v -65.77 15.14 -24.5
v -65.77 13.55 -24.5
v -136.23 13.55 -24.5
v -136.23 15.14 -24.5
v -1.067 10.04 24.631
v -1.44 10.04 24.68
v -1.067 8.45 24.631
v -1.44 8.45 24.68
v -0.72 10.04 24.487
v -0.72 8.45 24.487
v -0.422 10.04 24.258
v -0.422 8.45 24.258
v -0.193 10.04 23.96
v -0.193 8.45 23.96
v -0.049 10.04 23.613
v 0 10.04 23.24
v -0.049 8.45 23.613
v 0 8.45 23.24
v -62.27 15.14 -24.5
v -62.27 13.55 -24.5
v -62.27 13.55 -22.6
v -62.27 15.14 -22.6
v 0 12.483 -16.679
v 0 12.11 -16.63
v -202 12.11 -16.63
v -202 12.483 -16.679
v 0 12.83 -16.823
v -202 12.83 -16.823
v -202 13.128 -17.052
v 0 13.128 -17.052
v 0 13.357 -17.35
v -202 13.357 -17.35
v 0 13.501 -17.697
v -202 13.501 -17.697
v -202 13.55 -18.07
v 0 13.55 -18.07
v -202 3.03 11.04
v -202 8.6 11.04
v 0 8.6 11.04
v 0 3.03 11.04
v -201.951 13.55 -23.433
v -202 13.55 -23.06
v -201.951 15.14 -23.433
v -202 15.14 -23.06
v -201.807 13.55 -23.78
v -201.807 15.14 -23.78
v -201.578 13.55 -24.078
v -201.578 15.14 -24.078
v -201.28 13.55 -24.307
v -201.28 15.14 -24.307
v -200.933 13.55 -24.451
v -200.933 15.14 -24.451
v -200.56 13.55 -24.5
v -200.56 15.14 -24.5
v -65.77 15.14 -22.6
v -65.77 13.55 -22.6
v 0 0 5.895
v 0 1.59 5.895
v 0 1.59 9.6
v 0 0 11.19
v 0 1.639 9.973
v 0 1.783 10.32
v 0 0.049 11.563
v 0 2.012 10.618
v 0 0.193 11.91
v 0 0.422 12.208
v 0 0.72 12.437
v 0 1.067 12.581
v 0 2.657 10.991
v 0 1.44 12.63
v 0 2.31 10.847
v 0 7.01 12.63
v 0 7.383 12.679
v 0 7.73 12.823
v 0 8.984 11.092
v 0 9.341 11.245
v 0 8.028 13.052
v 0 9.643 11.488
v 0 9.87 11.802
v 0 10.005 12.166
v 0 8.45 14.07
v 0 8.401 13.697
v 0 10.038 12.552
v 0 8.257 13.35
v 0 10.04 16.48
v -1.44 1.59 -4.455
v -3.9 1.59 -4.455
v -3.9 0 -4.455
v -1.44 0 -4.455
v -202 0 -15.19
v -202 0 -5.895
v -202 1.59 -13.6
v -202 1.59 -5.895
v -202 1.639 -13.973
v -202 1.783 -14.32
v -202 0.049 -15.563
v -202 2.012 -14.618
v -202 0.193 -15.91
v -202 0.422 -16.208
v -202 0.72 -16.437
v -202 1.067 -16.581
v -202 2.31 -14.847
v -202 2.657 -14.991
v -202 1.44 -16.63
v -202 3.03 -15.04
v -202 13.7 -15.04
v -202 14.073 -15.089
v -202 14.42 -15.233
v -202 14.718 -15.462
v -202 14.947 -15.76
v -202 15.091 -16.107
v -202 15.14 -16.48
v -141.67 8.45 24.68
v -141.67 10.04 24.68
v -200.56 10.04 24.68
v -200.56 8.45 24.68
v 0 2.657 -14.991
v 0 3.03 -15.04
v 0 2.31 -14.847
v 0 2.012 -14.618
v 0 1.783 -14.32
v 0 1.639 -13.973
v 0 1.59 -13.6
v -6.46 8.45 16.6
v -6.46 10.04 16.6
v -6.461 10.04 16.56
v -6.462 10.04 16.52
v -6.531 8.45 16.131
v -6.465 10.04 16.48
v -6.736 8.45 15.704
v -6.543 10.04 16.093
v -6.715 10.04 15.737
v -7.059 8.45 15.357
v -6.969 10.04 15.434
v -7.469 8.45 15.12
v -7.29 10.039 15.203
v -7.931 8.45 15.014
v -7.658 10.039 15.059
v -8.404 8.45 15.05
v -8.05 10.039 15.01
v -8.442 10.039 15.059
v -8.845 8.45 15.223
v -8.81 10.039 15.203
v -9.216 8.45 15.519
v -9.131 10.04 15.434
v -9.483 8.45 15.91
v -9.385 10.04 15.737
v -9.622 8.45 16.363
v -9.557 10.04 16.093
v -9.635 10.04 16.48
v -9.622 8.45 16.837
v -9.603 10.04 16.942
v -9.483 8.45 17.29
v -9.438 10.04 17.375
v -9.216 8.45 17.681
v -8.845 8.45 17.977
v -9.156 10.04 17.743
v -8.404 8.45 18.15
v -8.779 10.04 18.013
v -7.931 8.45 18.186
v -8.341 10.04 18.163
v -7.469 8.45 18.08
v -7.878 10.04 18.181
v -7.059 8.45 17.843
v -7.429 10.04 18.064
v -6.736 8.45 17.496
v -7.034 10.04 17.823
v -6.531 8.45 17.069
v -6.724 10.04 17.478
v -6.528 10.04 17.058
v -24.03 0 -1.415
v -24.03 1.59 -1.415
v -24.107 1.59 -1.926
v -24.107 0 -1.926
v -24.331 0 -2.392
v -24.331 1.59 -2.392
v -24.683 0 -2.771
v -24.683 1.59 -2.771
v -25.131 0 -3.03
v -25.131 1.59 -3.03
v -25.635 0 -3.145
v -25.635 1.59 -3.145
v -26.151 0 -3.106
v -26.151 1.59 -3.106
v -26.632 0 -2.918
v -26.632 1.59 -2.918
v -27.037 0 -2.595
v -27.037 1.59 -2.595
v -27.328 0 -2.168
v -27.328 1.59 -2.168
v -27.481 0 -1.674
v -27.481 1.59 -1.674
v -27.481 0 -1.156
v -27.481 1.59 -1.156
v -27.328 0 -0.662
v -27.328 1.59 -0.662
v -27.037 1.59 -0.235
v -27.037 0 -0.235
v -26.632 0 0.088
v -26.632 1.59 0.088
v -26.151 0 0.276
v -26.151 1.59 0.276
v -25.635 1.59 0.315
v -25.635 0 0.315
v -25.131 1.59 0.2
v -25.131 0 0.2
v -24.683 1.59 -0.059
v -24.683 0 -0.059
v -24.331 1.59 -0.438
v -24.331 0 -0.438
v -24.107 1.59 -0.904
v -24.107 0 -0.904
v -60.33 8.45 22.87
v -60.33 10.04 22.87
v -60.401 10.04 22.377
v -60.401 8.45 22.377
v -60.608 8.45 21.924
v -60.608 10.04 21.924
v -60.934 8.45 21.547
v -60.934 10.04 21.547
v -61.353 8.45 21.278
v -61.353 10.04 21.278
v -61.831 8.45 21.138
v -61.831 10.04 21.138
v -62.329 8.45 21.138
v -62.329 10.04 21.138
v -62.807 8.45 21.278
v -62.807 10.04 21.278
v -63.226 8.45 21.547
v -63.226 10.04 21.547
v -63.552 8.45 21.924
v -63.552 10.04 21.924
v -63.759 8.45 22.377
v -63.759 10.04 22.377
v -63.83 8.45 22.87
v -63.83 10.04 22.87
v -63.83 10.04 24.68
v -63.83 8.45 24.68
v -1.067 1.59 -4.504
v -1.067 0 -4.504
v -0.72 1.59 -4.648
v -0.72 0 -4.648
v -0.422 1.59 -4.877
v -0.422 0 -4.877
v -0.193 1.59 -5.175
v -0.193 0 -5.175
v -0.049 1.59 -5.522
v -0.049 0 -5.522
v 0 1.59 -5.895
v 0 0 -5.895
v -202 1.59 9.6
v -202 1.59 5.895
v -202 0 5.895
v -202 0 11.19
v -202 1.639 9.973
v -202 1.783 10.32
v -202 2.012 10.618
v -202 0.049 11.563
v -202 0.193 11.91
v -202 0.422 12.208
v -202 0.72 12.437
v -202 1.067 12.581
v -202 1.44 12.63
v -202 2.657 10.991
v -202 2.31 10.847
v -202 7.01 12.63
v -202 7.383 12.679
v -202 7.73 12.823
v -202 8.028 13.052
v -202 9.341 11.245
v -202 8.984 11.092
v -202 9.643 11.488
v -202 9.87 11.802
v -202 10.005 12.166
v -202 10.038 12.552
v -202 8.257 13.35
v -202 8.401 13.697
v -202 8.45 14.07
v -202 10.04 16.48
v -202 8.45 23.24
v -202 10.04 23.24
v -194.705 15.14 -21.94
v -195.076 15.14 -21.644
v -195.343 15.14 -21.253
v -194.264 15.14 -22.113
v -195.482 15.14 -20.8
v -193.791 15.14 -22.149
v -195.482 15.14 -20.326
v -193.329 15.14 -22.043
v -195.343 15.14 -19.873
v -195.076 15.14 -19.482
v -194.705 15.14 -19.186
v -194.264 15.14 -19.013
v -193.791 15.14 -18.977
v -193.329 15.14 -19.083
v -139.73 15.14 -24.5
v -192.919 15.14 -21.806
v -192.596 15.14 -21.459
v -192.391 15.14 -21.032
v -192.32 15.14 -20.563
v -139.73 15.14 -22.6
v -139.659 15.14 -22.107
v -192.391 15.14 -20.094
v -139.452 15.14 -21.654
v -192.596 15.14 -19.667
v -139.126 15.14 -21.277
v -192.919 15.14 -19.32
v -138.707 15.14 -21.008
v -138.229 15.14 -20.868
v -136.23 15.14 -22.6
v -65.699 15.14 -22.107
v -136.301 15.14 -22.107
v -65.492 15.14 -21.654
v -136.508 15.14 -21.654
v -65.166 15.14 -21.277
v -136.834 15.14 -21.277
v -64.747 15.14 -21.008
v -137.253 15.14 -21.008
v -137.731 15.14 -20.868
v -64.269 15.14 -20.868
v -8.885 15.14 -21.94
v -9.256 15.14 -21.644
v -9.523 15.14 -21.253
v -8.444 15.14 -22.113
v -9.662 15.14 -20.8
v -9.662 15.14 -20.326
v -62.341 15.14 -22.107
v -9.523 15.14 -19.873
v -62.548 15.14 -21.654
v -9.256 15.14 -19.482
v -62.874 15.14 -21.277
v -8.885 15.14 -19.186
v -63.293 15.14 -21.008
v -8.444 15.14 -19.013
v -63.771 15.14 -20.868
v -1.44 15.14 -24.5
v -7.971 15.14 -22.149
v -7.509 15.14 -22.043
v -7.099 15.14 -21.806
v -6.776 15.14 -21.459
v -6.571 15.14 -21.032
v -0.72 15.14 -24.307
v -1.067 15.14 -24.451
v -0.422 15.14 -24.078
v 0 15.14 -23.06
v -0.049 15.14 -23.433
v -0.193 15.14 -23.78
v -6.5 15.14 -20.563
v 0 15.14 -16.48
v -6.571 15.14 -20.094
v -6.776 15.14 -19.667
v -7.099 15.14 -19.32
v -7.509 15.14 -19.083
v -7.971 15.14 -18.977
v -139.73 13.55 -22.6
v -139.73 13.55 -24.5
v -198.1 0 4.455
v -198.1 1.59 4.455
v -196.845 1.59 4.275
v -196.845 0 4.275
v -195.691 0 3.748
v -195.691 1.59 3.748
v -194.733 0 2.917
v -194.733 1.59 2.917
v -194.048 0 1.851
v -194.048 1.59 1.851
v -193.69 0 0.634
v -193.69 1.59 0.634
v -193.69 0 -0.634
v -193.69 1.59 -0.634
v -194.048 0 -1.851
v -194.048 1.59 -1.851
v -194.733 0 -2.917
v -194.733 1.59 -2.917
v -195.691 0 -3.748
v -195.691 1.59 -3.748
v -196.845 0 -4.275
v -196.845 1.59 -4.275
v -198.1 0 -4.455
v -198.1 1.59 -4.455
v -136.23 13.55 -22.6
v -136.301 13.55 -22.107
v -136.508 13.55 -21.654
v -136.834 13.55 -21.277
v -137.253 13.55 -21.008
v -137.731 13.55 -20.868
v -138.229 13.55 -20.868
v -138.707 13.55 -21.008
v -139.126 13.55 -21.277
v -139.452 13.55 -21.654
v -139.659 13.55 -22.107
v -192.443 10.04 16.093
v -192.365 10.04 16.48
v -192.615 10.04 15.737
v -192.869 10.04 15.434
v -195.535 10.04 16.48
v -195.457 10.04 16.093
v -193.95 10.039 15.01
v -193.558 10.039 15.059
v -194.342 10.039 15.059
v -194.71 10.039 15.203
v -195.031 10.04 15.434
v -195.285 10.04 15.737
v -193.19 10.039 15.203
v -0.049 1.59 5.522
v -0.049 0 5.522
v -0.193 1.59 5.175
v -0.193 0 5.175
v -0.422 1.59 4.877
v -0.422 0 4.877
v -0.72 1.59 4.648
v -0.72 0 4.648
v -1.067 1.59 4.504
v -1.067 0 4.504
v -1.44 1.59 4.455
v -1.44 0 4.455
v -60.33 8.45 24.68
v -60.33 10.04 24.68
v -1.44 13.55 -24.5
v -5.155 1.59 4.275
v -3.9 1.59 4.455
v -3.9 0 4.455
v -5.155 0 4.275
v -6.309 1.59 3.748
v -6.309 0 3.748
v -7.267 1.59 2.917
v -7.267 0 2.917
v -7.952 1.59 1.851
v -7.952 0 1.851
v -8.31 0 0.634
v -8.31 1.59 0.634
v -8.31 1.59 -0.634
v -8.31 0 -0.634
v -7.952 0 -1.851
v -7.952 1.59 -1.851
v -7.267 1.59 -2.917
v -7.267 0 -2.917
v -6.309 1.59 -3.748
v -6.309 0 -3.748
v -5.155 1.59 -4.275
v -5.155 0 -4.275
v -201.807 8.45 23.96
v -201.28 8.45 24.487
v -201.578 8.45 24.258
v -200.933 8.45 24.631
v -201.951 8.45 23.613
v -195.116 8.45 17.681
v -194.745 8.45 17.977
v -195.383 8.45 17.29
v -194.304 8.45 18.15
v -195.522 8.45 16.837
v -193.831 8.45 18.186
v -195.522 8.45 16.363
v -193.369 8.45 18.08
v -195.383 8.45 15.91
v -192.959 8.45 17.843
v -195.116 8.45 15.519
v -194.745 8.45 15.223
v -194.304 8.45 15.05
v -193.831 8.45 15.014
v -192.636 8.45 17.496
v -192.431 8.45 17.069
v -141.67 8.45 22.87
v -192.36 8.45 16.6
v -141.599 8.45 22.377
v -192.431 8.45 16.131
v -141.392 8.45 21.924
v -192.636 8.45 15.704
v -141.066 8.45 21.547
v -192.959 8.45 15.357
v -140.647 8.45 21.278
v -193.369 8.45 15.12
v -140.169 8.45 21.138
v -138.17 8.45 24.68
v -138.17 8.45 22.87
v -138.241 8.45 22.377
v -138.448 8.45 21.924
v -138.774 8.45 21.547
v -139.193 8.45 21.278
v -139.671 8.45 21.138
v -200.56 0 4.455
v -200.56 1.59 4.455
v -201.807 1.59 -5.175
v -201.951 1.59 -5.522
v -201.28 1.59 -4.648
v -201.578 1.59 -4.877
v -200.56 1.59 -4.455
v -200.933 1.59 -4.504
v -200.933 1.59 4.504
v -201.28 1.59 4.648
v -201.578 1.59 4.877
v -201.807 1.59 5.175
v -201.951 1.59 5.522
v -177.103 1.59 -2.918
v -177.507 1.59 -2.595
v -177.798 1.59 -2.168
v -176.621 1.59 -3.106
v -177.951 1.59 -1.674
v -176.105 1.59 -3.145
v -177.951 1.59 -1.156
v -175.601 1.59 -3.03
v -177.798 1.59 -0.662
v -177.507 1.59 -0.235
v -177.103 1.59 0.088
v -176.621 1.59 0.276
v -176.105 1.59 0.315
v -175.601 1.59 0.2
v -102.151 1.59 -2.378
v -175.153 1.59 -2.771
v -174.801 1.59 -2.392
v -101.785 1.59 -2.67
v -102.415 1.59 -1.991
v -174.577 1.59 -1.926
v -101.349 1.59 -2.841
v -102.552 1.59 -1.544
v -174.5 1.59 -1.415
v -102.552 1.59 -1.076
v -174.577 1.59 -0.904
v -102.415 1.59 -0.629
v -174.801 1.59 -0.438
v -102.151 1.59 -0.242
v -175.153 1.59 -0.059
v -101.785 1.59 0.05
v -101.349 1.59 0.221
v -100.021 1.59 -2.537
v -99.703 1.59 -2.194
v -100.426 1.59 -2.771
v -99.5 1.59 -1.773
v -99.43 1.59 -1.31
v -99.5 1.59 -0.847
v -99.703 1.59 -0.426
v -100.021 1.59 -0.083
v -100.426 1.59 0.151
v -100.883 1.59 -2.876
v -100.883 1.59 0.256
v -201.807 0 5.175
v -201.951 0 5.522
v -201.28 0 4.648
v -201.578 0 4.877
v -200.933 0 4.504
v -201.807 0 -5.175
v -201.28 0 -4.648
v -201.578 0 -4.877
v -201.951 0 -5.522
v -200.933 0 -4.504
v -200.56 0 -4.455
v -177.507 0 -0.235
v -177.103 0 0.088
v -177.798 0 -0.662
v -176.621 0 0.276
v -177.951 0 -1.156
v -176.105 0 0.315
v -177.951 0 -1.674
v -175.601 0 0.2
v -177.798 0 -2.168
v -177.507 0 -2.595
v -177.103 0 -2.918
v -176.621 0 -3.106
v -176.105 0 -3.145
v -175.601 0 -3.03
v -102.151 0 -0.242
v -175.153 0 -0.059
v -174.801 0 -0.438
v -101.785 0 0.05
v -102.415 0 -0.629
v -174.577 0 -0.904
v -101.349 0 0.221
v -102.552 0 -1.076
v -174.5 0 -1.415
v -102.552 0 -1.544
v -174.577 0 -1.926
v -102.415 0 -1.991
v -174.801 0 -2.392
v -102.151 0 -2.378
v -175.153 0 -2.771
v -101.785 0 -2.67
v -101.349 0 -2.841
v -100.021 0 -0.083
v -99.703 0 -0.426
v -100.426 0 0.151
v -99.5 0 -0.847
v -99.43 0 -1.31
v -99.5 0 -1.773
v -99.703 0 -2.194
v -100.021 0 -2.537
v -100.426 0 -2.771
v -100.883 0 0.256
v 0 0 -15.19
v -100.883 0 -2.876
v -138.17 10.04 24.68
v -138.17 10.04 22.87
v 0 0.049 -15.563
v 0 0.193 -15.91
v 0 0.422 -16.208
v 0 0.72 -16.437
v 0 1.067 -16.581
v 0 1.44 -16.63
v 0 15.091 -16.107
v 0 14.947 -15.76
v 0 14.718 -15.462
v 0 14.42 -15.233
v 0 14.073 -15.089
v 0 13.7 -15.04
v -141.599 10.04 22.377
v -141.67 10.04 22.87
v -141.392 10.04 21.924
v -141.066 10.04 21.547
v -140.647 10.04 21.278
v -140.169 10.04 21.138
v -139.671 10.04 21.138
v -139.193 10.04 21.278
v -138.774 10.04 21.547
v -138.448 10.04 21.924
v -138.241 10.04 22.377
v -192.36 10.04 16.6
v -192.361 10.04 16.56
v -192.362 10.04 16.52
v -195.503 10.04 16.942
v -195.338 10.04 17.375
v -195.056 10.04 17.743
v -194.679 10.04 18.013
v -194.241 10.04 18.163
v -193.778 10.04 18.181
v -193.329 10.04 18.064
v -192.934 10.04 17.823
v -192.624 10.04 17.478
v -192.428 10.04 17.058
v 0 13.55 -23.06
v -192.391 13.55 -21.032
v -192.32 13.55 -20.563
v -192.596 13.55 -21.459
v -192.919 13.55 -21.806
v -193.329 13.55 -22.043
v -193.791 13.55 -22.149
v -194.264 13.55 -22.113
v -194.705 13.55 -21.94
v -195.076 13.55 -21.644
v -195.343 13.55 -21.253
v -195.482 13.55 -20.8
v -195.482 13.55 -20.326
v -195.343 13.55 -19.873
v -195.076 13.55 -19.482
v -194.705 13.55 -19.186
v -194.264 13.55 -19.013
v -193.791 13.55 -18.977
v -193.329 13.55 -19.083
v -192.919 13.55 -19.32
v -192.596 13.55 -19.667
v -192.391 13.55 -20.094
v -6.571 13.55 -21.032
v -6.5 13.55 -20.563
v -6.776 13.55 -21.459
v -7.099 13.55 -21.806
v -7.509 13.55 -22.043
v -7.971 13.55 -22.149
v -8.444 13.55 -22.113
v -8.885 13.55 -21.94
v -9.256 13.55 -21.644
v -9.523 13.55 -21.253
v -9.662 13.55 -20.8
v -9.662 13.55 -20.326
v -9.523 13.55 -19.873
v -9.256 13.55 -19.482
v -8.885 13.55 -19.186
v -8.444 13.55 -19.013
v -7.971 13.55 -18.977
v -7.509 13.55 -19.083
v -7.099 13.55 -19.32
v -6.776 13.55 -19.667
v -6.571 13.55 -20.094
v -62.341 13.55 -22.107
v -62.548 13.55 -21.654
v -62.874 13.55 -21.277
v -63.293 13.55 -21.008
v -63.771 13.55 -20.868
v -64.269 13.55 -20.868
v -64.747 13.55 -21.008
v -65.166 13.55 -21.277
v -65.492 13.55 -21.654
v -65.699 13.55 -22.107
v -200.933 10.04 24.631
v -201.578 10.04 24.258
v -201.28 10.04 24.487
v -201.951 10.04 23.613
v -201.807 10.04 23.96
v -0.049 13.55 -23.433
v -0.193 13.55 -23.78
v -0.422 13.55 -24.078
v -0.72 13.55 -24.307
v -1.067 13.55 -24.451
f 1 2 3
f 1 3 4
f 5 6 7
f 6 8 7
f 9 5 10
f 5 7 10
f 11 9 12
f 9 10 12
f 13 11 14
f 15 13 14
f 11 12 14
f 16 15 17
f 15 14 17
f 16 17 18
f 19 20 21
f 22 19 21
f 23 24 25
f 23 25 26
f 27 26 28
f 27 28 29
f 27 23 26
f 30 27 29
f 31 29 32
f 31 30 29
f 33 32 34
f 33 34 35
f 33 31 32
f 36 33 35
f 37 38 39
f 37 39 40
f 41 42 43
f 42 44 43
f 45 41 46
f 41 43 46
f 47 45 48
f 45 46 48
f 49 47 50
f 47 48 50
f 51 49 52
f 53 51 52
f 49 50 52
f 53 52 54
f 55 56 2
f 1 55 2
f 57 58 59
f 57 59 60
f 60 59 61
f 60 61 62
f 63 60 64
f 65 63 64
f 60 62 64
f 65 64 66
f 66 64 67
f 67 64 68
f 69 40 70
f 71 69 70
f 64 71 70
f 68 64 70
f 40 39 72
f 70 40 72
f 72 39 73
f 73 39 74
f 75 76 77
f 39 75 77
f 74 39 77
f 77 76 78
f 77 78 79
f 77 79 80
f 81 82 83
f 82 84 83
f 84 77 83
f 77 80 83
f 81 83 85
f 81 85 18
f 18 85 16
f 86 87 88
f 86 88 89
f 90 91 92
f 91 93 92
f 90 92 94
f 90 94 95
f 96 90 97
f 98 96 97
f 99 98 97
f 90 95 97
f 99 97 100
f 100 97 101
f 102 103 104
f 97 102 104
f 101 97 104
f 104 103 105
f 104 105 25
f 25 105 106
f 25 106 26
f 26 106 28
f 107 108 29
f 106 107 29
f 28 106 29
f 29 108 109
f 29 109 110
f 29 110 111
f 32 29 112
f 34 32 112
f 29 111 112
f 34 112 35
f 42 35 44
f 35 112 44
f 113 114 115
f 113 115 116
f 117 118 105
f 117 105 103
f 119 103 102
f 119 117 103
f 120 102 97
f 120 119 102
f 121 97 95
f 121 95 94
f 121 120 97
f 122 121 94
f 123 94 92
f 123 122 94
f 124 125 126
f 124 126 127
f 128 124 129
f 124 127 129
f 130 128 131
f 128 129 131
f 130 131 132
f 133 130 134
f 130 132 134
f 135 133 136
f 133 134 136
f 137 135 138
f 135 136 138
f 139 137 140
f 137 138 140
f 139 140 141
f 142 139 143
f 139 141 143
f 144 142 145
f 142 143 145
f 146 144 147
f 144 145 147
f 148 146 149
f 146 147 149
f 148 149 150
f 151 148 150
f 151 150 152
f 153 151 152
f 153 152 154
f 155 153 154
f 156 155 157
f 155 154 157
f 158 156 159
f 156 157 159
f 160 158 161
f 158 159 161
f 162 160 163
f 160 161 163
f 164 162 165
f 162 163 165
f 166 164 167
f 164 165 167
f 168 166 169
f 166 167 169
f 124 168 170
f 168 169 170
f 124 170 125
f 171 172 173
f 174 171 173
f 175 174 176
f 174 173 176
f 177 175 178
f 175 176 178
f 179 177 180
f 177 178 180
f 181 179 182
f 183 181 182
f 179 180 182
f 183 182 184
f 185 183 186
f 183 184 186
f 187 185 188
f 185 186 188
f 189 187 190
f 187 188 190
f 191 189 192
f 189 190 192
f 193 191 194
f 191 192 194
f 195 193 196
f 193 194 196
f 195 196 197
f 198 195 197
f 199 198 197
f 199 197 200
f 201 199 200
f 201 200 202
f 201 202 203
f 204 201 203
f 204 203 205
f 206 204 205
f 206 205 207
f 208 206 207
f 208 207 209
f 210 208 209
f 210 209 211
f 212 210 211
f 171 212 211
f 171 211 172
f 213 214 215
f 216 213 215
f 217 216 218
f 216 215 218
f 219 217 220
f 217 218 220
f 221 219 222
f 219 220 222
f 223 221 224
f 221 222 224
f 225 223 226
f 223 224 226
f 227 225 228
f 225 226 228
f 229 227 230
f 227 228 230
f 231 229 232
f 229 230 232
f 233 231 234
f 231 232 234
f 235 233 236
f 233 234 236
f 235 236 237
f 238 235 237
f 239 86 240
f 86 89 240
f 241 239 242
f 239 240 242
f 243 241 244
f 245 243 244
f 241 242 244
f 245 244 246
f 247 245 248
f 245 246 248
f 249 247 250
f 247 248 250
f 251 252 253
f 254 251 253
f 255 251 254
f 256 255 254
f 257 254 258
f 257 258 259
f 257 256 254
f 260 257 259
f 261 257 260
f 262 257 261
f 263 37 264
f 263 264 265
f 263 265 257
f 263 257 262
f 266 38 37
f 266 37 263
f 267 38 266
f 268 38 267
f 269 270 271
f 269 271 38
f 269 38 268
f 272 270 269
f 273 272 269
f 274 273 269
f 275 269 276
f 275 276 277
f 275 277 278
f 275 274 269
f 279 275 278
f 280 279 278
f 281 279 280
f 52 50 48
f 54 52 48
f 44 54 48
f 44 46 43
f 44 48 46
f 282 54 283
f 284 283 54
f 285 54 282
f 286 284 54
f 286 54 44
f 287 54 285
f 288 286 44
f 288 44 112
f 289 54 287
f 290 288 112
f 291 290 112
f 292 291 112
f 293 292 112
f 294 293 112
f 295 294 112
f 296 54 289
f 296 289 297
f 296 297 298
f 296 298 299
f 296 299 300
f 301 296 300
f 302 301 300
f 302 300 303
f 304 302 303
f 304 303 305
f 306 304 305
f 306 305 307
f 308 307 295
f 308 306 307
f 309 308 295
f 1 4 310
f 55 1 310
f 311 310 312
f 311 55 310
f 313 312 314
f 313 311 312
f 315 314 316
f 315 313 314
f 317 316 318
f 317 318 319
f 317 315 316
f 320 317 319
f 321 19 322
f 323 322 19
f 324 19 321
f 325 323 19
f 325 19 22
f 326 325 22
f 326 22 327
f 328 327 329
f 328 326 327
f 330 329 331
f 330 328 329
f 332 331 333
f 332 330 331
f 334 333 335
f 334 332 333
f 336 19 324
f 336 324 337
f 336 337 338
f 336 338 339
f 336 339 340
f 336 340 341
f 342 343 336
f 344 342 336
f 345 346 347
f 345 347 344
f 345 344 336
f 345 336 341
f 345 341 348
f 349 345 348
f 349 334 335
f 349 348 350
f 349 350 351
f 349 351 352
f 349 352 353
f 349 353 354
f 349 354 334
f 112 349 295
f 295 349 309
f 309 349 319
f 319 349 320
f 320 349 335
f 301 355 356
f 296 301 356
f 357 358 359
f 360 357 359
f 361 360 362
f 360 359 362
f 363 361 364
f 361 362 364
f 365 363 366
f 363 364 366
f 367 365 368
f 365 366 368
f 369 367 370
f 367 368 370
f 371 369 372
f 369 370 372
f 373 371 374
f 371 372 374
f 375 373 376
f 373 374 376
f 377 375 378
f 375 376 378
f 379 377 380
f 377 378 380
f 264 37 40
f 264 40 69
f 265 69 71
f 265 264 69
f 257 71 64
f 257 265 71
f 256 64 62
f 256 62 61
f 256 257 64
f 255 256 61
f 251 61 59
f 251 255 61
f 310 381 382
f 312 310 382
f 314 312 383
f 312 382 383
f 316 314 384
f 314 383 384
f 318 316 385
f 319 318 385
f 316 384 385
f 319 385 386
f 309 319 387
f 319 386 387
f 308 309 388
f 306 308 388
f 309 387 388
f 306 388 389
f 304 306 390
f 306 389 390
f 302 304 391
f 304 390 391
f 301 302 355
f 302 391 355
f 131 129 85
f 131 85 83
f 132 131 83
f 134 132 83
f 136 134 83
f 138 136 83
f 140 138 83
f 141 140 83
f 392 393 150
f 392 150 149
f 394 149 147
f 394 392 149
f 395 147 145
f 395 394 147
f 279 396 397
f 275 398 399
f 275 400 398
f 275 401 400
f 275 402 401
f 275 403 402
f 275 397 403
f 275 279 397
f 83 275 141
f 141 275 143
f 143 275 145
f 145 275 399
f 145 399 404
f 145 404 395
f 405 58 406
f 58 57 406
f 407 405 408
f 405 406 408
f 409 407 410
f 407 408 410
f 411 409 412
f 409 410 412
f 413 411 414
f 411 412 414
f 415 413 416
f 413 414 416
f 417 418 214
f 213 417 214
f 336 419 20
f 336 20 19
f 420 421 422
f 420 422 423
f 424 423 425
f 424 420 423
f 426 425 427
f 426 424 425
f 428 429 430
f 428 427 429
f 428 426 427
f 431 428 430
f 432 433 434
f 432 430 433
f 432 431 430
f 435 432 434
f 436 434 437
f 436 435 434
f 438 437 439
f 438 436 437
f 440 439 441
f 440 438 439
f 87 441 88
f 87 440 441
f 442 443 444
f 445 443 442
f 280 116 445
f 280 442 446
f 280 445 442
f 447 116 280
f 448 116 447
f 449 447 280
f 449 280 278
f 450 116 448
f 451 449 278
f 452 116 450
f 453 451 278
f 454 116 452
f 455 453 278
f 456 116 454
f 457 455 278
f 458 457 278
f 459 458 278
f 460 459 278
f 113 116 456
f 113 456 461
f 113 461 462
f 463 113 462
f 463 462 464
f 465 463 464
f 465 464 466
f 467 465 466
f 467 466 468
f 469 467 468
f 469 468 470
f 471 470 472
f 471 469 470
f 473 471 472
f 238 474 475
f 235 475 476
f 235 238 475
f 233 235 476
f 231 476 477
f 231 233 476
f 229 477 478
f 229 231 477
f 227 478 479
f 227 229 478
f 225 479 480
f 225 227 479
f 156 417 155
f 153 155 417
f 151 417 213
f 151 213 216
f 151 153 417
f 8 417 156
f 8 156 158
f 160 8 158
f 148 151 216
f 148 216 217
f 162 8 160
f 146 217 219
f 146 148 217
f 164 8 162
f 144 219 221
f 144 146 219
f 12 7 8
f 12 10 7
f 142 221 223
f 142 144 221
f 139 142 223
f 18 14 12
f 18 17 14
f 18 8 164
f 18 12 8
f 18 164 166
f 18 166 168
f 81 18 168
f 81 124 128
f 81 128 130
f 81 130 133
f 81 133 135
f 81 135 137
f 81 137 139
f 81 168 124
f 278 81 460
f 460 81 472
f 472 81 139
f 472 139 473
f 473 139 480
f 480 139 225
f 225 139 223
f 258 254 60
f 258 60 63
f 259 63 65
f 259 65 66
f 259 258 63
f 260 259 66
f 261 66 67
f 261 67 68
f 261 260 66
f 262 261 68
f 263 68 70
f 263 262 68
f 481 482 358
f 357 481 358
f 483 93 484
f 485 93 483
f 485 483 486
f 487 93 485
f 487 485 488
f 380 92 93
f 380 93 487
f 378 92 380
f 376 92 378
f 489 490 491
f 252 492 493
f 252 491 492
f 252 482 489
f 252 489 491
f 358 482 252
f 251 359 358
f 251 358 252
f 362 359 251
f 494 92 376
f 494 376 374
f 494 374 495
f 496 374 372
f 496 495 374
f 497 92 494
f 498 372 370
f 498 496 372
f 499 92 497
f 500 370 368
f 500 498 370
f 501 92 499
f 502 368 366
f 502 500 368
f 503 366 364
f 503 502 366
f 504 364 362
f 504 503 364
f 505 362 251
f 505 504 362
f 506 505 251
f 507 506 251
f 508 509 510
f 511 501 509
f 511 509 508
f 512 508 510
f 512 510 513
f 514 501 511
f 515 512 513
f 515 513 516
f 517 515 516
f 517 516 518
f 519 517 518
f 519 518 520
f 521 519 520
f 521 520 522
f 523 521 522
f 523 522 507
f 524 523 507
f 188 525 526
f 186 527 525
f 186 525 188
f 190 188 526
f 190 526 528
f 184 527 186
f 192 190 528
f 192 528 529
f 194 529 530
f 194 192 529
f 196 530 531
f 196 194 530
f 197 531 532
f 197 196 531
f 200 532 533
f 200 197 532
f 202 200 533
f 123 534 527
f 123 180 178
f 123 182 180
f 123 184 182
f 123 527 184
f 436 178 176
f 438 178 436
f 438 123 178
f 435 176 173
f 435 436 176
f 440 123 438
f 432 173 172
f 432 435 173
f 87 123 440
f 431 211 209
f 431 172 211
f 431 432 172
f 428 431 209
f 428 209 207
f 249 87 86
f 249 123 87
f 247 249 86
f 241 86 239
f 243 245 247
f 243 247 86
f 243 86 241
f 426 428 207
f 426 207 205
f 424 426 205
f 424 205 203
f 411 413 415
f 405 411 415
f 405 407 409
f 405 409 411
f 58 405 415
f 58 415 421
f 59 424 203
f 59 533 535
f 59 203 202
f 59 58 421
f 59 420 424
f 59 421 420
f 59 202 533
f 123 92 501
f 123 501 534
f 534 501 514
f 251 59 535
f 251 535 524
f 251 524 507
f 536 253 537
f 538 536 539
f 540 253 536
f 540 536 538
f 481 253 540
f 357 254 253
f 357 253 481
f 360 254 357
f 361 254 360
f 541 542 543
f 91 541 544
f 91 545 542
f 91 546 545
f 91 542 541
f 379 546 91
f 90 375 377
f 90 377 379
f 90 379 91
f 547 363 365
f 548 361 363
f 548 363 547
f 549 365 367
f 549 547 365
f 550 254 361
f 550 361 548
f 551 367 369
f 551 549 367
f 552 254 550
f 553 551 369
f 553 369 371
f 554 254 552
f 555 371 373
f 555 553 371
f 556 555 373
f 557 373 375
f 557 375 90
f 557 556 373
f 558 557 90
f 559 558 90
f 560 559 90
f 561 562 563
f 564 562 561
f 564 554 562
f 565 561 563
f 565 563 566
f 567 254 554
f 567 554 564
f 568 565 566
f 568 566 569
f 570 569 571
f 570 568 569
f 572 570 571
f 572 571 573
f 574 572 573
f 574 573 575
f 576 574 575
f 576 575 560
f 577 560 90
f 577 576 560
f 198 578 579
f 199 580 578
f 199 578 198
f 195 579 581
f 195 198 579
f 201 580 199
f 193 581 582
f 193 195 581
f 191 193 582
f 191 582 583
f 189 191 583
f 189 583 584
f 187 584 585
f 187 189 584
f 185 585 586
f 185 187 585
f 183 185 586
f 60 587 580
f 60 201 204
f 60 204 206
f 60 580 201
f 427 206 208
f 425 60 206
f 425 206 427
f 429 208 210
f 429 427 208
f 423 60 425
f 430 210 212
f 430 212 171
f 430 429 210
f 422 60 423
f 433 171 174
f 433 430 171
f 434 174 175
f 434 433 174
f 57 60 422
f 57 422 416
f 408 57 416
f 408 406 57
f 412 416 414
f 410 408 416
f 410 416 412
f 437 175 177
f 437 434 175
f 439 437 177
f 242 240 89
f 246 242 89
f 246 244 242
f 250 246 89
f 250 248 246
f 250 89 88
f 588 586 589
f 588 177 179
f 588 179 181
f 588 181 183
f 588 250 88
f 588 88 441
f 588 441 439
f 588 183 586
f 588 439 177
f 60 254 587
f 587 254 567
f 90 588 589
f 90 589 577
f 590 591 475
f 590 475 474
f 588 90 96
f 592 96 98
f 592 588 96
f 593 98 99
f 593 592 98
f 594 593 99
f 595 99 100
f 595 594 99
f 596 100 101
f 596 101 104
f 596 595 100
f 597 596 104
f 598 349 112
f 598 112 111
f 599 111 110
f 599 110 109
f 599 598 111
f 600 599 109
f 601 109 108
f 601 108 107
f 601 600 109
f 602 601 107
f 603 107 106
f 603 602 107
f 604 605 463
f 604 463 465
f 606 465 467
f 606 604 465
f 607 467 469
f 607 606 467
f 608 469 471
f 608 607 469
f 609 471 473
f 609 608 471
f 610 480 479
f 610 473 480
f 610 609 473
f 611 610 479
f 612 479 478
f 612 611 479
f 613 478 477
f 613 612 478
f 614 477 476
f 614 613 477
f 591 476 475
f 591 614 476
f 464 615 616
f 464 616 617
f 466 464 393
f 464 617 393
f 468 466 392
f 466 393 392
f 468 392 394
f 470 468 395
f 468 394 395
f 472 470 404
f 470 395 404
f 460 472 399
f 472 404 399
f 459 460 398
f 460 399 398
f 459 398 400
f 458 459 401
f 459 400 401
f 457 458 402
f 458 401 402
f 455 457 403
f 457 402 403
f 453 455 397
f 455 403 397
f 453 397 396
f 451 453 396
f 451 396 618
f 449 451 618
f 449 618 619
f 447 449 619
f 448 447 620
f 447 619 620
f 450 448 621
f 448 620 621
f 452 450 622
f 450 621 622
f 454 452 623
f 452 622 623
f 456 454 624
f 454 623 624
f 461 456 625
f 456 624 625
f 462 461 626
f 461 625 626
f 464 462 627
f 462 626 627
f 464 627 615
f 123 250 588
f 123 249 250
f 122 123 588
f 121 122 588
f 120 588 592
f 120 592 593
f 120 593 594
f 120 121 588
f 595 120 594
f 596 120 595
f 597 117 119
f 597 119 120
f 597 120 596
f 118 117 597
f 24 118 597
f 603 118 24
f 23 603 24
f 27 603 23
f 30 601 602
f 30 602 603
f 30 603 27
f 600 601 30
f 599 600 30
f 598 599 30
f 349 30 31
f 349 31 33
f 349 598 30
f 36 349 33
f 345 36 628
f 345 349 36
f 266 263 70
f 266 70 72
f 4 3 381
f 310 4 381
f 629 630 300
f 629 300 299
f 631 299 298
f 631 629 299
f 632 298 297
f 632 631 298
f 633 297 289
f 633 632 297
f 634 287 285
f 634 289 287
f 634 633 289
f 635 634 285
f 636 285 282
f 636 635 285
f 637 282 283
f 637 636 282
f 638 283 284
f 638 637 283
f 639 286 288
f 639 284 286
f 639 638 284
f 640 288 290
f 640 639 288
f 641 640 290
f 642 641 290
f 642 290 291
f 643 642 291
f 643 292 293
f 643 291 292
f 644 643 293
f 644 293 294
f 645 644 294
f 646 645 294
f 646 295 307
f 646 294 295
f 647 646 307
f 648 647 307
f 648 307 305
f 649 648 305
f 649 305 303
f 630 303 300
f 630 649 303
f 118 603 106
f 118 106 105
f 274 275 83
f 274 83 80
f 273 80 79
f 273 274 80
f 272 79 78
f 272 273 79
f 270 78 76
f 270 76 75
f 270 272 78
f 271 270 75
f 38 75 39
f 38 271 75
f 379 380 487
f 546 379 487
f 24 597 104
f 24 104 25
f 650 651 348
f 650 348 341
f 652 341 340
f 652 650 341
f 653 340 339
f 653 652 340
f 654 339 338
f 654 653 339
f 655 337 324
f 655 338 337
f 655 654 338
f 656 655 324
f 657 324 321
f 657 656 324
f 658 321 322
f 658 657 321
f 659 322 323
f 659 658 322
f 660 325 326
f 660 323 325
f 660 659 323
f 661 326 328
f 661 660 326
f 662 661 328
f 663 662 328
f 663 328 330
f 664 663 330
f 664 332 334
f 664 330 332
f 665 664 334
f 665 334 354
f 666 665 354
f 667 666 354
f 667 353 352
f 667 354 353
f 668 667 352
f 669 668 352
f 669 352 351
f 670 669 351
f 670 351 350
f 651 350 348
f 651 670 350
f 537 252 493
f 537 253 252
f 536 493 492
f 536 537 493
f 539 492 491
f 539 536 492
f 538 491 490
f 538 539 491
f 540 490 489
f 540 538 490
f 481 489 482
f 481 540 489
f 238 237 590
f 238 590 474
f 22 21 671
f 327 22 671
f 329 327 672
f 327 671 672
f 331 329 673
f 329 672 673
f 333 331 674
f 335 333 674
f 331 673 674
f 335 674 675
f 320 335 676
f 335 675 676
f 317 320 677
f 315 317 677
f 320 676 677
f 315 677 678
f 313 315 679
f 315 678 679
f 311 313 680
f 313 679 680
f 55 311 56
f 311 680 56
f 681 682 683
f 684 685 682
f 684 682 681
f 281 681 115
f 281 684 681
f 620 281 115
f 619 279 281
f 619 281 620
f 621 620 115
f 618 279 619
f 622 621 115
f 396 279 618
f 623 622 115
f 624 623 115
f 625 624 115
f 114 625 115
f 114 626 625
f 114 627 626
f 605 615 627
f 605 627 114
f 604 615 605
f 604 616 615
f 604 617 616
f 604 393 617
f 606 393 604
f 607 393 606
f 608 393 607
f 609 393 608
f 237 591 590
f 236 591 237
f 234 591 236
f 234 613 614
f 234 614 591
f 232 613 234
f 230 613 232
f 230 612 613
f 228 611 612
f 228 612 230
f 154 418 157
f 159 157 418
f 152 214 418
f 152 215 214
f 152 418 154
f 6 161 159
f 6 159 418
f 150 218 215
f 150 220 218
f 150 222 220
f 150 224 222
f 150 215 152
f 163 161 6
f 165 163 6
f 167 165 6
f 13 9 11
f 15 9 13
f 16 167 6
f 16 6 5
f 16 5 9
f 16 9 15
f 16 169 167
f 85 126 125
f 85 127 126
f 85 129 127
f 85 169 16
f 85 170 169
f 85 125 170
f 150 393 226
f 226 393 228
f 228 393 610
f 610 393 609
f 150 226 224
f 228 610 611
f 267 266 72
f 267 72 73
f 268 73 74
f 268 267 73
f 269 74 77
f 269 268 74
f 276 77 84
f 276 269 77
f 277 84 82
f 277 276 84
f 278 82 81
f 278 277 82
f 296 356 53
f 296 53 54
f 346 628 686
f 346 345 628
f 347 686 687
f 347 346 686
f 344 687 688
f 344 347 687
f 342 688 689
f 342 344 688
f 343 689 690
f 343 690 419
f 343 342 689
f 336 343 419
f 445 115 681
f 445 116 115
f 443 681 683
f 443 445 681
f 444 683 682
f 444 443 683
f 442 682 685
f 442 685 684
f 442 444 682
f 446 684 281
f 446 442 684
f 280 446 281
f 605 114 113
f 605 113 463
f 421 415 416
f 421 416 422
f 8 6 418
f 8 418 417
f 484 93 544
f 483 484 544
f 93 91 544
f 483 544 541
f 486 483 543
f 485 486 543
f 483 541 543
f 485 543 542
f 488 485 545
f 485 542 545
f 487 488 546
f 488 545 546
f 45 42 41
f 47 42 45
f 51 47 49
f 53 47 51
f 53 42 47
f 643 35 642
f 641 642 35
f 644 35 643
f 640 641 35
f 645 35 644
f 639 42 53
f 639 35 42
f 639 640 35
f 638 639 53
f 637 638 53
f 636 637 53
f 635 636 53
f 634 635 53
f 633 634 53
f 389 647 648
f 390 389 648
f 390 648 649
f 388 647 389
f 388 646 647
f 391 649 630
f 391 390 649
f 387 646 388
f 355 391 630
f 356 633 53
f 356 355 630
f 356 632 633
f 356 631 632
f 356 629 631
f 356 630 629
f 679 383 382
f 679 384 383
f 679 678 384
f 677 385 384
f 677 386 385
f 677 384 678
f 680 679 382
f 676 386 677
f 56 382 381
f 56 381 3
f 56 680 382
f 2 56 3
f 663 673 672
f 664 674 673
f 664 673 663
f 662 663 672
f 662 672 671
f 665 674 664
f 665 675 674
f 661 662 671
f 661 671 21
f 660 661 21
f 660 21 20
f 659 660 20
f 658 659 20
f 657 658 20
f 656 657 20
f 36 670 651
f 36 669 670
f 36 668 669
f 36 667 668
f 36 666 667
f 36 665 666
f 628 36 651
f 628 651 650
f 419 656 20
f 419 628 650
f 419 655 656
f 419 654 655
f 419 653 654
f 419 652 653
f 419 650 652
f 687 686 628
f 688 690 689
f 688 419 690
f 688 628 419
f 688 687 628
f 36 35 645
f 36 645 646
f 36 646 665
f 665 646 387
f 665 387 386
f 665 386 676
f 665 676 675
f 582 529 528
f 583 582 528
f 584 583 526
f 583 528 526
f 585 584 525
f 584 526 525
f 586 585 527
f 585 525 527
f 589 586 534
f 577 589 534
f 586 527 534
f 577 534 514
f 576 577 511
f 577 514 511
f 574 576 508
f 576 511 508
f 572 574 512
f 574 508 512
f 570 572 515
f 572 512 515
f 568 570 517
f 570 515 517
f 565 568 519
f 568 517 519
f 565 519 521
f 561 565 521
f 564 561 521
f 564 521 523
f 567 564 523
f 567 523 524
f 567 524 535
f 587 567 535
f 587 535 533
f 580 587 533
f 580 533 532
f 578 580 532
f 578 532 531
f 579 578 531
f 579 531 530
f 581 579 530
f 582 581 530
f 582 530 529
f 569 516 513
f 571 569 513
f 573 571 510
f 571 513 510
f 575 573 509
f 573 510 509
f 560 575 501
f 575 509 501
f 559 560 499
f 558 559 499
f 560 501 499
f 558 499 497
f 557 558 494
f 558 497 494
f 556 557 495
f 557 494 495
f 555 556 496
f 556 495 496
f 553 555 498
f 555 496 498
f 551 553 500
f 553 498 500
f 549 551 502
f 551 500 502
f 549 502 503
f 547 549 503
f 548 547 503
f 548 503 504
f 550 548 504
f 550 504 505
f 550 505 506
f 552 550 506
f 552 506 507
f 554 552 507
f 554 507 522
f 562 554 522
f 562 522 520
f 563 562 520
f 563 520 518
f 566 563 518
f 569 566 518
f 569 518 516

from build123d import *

# Parameters (mm, degrees)
BOSS_EXTRUDE1_DEPTH     = 202
FILLET1_R               = 1.44
FILLET2_R               = 1.44
SKETCH2_R               = 1.59
SKETCH2_R_2             = 1.735
SKETCH2_R_3             = 1.57
CUT_EXTRUDE1_DEPTH      = 6.1
CUT_EXTRUDE1_DEPTH_BACK = 11.04
FILLET3_R               = 1.44
BOSS_EXTRUDE2_DEPTH     = 202
CUT_EXTRUDE2_DEPTH      = 203
SKETCH5_R               = 1.59
CUT_EXTRUDE3_DEPTH      = 10
SKETCH6_R               = 1.59
BOSS_EXTRUDE3_DEPTH     = 1.59


with BuildPart() as part:
    # Sketch1 → Boss-Extrude1 (new body)
    with BuildSketch(Plane(origin=(0, 0, 0), x_dir=(0, 0, -1), z_dir=(1, 0, 0))):
        with BuildLine():
            Line((-15.04, 0), (15.04, 0))
            Line((15.04, 0), (15.19, 0))
            ThreePointArc((15.19, 0), (16.208233765, 0.421766235), (16.63, 1.44))
            Line((16.63, 1.44), (16.63, 12.11))
            ThreePointArc((16.63, 12.11), (17.051766235, 13.128233765), (18.07, 13.55))
            Line((18.07, 13.55), (24.5, 13.55))
            Line((24.5, 13.55), (24.5, 15.14))
            Line((24.5, 15.14), (16.48, 15.14))
            ThreePointArc((16.48, 15.14), (15.461766235, 14.718233765), (15.04, 13.7))
            Line((15.04, 13.7), (15.04, 3.03))
            ThreePointArc((15.04, 3.03), (14.618233765, 2.011766235), (13.6, 1.59))
            Line((13.6, 1.59), (-13.6, 1.59))
            ThreePointArc((-13.6, 1.59), (-14.618233765, 2.011766235), (-15.04, 3.03))
            Line((-15.04, 3.03), (-15.04, 8.6))
            ThreePointArc((-15.04, 8.6), (-15.461766235, 9.618233765), (-16.48, 10.04))
            Line((-16.48, 10.04), (-24.68, 10.04))
            Line((-24.68, 10.04), (-24.68, 8.45))
            Line((-24.68, 8.45), (-18.07, 8.45))
            ThreePointArc((-18.07, 8.45), (-17.051766235, 8.028233765), (-16.63, 7.01))
            Line((-16.63, 7.01), (-16.63, 1.44))
            ThreePointArc((-16.63, 1.44), (-16.208233765, 0.421766235), (-15.19, 0))
            Line((-15.19, 0), (-15.04, 0))
        make_face()
    extrude(amount=-BOSS_EXTRUDE1_DEPTH)

    # Fillet1
    fillet1_edges = [part.edges().sort_by_distance(p)[0] for p in [
        (0, 9.245, 24.68),
    ]]
    fillet(fillet1_edges, radius=FILLET1_R)

    # Fillet2
    fillet2_edges = [part.edges().sort_by_distance(p)[0] for p in [
        (-202, 14.345, -24.5),
        (0, 14.345, -24.5),
        (-202, 9.245, 24.68),
    ]]
    fillet(fillet2_edges, radius=FILLET2_R)

    # Sketch2 → Cut-Extrude1 (cut, two sides)
    with BuildSketch(Plane(origin=(0, 10.04, 0), x_dir=(1, 0, 0), z_dir=(0, 1, 0))) as cut_extrude1_sk:
        with Locations((-193.95, -20.6)):
            Circle(SKETCH2_R)
        with Locations((-8.05, -20.6)):
            Circle(SKETCH2_R)
        with Locations((-176.235, 1.415)):
            Circle(SKETCH2_R_2)
        with Locations((-25.765, 1.415)):
            Circle(SKETCH2_R_2)
        with Locations((-193.91, 20.563)):
            Circle(SKETCH2_R)
        with Locations((-101, 1.31)):
            Circle(SKETCH2_R_3)
        with Locations((-8.09, 20.563)):
            Circle(SKETCH2_R)
        with BuildLine():
            Line((0, 4.455), (0, -4.455))
            Line((0, -4.455), (-3.9, -4.455))
            ThreePointArc((-3.9, -4.455), (-8.355, 0), (-3.9, 4.455))
            Line((-3.9, 4.455), (0, 4.455))
        make_face()
        with BuildLine():
            Line((-141.669852281, -24.68), (-141.669852281, -22.87))
            ThreePointArc((-141.669852281, -22.87), (-139.919852281, -21.12), (-138.169852281, -22.87))
            Line((-138.169852281, -22.87), (-138.169852281, -24.68))
            Line((-138.169852281, -24.68), (-141.669852281, -24.68))
        make_face()
        with BuildLine():
            Line((-63.830147719, -22.87), (-63.830147719, -24.68))
            Line((-63.830147719, -24.68), (-60.330147719, -24.68))
            Line((-60.330147719, -24.68), (-60.330147719, -22.87))
            ThreePointArc((-60.330147719, -22.87), (-62.080147719, -21.12), (-63.830147719, -22.87))
        make_face()
        with BuildLine():
            Line((-139.73, 24.5), (-136.23, 24.5))
            Line((-136.23, 24.5), (-136.23, 22.6))
            ThreePointArc((-136.23, 22.6), (-137.98, 20.85), (-139.73, 22.6))
            Line((-139.73, 22.6), (-139.73, 24.5))
        make_face()
        with BuildLine():
            Line((-202, 4.455), (-202, -4.455))
            Line((-202, -4.455), (-198.1, -4.455))
            ThreePointArc((-198.1, -4.455), (-193.645, 0), (-198.1, 4.455))
            Line((-198.1, 4.455), (-202, 4.455))
        make_face()
        with BuildLine():
            Line((-62.27, 24.5), (-62.27, 22.6))
            ThreePointArc((-62.27, 22.6), (-64.02, 20.85), (-65.77, 22.6))
            Line((-65.77, 22.6), (-65.77, 24.5))
            Line((-65.77, 24.5), (-62.27, 24.5))
        make_face()
    extrude(amount=CUT_EXTRUDE1_DEPTH, mode=Mode.SUBTRACT)
    extrude(cut_extrude1_sk.sketch, amount=-CUT_EXTRUDE1_DEPTH_BACK, mode=Mode.SUBTRACT)

    # Fillet3
    fillet3_edges = [part.edges().sort_by_distance(p)[0] for p in [
        (-202, 0.795, 4.455),
        (-202, 0.795, -4.455),
        (0, 0.795, -4.455),
        (0, 0.795, 4.455),
    ]]
    fillet(fillet3_edges, radius=FILLET3_R)

    # Sketch3 → Boss-Extrude2 (add)
    with BuildSketch(Plane.ZY.offset(202)):
        with BuildLine():
            Line((15.04, 3.03), (15.04, 8.6))
            ThreePointArc((15.04, 8.6), (15.461766235, 9.618233765), (16.48, 10.04))
            Line((16.48, 10.04), (12.551925622, 10.038202595))
            ThreePointArc((12.551925622, 10.038202595), (11.487521511, 9.643353463), (11.04, 8.6))
            Line((11.04, 8.6), (11.04, 3.03))
            ThreePointArc((11.04, 3.03), (10.618233765, 2.011766235), (9.6, 1.59))
            Line((9.6, 1.59), (13.6, 1.59))
            ThreePointArc((13.6, 1.59), (14.618233765, 2.011766235), (15.04, 3.03))
        make_face()
    extrude(amount=-BOSS_EXTRUDE2_DEPTH)

    # Sketch4 → Cut-Extrude2 (cut, through all)
    with BuildSketch(Plane.ZY.offset(202)):
        with BuildLine():
            Line((16.63, 7.01), (16.63, 1.44))
            ThreePointArc((16.63, 1.44), (16.208233765, 0.421766235), (15.19, 0))
            Line((15.19, 0), (11.19, 0))
            ThreePointArc((11.19, 0), (12.208233765, 0.421766235), (12.63, 1.44))
            Line((12.63, 1.44), (12.63, 7.01))
            ThreePointArc((12.63, 7.01), (13.051766235, 8.028233765), (14.07, 8.45))
            Line((14.07, 8.45), (18.07, 8.45))
            ThreePointArc((18.07, 8.45), (17.051766235, 8.028233765), (16.63, 7.01))
        make_face()
    extrude(amount=-CUT_EXTRUDE2_DEPTH, mode=Mode.SUBTRACT)

    # Sketch5 → Cut-Extrude3 (cut)
    with BuildSketch(Plane(origin=(0, 10.04, 0), x_dir=(1, 0, 0), z_dir=(0, 1, 0))):
        with Locations((-193.95, -20.6)):
            Circle(SKETCH5_R)
        with Locations((-8.05, -20.6)):
            Circle(SKETCH5_R)
        with Locations((-193.95, -16.6)):
            Circle(SKETCH5_R)
        with Locations((-8.05, -16.6)):
            Circle(SKETCH5_R)
    extrude(amount=-CUT_EXTRUDE3_DEPTH, mode=Mode.SUBTRACT)

    # Sketch6 → Boss-Extrude3 (add)
    with BuildSketch(Plane(origin=(0, 10.04, 0), x_dir=(1, 0, 0), z_dir=(0, 1, 0))):
        with Locations((-193.95, -20.6)):
            Circle(SKETCH6_R)
        with Locations((-8.05, -20.6)):
            Circle(SKETCH6_R)
    extrude(amount=-BOSS_EXTRUDE3_DEPTH)


solid = part.part
